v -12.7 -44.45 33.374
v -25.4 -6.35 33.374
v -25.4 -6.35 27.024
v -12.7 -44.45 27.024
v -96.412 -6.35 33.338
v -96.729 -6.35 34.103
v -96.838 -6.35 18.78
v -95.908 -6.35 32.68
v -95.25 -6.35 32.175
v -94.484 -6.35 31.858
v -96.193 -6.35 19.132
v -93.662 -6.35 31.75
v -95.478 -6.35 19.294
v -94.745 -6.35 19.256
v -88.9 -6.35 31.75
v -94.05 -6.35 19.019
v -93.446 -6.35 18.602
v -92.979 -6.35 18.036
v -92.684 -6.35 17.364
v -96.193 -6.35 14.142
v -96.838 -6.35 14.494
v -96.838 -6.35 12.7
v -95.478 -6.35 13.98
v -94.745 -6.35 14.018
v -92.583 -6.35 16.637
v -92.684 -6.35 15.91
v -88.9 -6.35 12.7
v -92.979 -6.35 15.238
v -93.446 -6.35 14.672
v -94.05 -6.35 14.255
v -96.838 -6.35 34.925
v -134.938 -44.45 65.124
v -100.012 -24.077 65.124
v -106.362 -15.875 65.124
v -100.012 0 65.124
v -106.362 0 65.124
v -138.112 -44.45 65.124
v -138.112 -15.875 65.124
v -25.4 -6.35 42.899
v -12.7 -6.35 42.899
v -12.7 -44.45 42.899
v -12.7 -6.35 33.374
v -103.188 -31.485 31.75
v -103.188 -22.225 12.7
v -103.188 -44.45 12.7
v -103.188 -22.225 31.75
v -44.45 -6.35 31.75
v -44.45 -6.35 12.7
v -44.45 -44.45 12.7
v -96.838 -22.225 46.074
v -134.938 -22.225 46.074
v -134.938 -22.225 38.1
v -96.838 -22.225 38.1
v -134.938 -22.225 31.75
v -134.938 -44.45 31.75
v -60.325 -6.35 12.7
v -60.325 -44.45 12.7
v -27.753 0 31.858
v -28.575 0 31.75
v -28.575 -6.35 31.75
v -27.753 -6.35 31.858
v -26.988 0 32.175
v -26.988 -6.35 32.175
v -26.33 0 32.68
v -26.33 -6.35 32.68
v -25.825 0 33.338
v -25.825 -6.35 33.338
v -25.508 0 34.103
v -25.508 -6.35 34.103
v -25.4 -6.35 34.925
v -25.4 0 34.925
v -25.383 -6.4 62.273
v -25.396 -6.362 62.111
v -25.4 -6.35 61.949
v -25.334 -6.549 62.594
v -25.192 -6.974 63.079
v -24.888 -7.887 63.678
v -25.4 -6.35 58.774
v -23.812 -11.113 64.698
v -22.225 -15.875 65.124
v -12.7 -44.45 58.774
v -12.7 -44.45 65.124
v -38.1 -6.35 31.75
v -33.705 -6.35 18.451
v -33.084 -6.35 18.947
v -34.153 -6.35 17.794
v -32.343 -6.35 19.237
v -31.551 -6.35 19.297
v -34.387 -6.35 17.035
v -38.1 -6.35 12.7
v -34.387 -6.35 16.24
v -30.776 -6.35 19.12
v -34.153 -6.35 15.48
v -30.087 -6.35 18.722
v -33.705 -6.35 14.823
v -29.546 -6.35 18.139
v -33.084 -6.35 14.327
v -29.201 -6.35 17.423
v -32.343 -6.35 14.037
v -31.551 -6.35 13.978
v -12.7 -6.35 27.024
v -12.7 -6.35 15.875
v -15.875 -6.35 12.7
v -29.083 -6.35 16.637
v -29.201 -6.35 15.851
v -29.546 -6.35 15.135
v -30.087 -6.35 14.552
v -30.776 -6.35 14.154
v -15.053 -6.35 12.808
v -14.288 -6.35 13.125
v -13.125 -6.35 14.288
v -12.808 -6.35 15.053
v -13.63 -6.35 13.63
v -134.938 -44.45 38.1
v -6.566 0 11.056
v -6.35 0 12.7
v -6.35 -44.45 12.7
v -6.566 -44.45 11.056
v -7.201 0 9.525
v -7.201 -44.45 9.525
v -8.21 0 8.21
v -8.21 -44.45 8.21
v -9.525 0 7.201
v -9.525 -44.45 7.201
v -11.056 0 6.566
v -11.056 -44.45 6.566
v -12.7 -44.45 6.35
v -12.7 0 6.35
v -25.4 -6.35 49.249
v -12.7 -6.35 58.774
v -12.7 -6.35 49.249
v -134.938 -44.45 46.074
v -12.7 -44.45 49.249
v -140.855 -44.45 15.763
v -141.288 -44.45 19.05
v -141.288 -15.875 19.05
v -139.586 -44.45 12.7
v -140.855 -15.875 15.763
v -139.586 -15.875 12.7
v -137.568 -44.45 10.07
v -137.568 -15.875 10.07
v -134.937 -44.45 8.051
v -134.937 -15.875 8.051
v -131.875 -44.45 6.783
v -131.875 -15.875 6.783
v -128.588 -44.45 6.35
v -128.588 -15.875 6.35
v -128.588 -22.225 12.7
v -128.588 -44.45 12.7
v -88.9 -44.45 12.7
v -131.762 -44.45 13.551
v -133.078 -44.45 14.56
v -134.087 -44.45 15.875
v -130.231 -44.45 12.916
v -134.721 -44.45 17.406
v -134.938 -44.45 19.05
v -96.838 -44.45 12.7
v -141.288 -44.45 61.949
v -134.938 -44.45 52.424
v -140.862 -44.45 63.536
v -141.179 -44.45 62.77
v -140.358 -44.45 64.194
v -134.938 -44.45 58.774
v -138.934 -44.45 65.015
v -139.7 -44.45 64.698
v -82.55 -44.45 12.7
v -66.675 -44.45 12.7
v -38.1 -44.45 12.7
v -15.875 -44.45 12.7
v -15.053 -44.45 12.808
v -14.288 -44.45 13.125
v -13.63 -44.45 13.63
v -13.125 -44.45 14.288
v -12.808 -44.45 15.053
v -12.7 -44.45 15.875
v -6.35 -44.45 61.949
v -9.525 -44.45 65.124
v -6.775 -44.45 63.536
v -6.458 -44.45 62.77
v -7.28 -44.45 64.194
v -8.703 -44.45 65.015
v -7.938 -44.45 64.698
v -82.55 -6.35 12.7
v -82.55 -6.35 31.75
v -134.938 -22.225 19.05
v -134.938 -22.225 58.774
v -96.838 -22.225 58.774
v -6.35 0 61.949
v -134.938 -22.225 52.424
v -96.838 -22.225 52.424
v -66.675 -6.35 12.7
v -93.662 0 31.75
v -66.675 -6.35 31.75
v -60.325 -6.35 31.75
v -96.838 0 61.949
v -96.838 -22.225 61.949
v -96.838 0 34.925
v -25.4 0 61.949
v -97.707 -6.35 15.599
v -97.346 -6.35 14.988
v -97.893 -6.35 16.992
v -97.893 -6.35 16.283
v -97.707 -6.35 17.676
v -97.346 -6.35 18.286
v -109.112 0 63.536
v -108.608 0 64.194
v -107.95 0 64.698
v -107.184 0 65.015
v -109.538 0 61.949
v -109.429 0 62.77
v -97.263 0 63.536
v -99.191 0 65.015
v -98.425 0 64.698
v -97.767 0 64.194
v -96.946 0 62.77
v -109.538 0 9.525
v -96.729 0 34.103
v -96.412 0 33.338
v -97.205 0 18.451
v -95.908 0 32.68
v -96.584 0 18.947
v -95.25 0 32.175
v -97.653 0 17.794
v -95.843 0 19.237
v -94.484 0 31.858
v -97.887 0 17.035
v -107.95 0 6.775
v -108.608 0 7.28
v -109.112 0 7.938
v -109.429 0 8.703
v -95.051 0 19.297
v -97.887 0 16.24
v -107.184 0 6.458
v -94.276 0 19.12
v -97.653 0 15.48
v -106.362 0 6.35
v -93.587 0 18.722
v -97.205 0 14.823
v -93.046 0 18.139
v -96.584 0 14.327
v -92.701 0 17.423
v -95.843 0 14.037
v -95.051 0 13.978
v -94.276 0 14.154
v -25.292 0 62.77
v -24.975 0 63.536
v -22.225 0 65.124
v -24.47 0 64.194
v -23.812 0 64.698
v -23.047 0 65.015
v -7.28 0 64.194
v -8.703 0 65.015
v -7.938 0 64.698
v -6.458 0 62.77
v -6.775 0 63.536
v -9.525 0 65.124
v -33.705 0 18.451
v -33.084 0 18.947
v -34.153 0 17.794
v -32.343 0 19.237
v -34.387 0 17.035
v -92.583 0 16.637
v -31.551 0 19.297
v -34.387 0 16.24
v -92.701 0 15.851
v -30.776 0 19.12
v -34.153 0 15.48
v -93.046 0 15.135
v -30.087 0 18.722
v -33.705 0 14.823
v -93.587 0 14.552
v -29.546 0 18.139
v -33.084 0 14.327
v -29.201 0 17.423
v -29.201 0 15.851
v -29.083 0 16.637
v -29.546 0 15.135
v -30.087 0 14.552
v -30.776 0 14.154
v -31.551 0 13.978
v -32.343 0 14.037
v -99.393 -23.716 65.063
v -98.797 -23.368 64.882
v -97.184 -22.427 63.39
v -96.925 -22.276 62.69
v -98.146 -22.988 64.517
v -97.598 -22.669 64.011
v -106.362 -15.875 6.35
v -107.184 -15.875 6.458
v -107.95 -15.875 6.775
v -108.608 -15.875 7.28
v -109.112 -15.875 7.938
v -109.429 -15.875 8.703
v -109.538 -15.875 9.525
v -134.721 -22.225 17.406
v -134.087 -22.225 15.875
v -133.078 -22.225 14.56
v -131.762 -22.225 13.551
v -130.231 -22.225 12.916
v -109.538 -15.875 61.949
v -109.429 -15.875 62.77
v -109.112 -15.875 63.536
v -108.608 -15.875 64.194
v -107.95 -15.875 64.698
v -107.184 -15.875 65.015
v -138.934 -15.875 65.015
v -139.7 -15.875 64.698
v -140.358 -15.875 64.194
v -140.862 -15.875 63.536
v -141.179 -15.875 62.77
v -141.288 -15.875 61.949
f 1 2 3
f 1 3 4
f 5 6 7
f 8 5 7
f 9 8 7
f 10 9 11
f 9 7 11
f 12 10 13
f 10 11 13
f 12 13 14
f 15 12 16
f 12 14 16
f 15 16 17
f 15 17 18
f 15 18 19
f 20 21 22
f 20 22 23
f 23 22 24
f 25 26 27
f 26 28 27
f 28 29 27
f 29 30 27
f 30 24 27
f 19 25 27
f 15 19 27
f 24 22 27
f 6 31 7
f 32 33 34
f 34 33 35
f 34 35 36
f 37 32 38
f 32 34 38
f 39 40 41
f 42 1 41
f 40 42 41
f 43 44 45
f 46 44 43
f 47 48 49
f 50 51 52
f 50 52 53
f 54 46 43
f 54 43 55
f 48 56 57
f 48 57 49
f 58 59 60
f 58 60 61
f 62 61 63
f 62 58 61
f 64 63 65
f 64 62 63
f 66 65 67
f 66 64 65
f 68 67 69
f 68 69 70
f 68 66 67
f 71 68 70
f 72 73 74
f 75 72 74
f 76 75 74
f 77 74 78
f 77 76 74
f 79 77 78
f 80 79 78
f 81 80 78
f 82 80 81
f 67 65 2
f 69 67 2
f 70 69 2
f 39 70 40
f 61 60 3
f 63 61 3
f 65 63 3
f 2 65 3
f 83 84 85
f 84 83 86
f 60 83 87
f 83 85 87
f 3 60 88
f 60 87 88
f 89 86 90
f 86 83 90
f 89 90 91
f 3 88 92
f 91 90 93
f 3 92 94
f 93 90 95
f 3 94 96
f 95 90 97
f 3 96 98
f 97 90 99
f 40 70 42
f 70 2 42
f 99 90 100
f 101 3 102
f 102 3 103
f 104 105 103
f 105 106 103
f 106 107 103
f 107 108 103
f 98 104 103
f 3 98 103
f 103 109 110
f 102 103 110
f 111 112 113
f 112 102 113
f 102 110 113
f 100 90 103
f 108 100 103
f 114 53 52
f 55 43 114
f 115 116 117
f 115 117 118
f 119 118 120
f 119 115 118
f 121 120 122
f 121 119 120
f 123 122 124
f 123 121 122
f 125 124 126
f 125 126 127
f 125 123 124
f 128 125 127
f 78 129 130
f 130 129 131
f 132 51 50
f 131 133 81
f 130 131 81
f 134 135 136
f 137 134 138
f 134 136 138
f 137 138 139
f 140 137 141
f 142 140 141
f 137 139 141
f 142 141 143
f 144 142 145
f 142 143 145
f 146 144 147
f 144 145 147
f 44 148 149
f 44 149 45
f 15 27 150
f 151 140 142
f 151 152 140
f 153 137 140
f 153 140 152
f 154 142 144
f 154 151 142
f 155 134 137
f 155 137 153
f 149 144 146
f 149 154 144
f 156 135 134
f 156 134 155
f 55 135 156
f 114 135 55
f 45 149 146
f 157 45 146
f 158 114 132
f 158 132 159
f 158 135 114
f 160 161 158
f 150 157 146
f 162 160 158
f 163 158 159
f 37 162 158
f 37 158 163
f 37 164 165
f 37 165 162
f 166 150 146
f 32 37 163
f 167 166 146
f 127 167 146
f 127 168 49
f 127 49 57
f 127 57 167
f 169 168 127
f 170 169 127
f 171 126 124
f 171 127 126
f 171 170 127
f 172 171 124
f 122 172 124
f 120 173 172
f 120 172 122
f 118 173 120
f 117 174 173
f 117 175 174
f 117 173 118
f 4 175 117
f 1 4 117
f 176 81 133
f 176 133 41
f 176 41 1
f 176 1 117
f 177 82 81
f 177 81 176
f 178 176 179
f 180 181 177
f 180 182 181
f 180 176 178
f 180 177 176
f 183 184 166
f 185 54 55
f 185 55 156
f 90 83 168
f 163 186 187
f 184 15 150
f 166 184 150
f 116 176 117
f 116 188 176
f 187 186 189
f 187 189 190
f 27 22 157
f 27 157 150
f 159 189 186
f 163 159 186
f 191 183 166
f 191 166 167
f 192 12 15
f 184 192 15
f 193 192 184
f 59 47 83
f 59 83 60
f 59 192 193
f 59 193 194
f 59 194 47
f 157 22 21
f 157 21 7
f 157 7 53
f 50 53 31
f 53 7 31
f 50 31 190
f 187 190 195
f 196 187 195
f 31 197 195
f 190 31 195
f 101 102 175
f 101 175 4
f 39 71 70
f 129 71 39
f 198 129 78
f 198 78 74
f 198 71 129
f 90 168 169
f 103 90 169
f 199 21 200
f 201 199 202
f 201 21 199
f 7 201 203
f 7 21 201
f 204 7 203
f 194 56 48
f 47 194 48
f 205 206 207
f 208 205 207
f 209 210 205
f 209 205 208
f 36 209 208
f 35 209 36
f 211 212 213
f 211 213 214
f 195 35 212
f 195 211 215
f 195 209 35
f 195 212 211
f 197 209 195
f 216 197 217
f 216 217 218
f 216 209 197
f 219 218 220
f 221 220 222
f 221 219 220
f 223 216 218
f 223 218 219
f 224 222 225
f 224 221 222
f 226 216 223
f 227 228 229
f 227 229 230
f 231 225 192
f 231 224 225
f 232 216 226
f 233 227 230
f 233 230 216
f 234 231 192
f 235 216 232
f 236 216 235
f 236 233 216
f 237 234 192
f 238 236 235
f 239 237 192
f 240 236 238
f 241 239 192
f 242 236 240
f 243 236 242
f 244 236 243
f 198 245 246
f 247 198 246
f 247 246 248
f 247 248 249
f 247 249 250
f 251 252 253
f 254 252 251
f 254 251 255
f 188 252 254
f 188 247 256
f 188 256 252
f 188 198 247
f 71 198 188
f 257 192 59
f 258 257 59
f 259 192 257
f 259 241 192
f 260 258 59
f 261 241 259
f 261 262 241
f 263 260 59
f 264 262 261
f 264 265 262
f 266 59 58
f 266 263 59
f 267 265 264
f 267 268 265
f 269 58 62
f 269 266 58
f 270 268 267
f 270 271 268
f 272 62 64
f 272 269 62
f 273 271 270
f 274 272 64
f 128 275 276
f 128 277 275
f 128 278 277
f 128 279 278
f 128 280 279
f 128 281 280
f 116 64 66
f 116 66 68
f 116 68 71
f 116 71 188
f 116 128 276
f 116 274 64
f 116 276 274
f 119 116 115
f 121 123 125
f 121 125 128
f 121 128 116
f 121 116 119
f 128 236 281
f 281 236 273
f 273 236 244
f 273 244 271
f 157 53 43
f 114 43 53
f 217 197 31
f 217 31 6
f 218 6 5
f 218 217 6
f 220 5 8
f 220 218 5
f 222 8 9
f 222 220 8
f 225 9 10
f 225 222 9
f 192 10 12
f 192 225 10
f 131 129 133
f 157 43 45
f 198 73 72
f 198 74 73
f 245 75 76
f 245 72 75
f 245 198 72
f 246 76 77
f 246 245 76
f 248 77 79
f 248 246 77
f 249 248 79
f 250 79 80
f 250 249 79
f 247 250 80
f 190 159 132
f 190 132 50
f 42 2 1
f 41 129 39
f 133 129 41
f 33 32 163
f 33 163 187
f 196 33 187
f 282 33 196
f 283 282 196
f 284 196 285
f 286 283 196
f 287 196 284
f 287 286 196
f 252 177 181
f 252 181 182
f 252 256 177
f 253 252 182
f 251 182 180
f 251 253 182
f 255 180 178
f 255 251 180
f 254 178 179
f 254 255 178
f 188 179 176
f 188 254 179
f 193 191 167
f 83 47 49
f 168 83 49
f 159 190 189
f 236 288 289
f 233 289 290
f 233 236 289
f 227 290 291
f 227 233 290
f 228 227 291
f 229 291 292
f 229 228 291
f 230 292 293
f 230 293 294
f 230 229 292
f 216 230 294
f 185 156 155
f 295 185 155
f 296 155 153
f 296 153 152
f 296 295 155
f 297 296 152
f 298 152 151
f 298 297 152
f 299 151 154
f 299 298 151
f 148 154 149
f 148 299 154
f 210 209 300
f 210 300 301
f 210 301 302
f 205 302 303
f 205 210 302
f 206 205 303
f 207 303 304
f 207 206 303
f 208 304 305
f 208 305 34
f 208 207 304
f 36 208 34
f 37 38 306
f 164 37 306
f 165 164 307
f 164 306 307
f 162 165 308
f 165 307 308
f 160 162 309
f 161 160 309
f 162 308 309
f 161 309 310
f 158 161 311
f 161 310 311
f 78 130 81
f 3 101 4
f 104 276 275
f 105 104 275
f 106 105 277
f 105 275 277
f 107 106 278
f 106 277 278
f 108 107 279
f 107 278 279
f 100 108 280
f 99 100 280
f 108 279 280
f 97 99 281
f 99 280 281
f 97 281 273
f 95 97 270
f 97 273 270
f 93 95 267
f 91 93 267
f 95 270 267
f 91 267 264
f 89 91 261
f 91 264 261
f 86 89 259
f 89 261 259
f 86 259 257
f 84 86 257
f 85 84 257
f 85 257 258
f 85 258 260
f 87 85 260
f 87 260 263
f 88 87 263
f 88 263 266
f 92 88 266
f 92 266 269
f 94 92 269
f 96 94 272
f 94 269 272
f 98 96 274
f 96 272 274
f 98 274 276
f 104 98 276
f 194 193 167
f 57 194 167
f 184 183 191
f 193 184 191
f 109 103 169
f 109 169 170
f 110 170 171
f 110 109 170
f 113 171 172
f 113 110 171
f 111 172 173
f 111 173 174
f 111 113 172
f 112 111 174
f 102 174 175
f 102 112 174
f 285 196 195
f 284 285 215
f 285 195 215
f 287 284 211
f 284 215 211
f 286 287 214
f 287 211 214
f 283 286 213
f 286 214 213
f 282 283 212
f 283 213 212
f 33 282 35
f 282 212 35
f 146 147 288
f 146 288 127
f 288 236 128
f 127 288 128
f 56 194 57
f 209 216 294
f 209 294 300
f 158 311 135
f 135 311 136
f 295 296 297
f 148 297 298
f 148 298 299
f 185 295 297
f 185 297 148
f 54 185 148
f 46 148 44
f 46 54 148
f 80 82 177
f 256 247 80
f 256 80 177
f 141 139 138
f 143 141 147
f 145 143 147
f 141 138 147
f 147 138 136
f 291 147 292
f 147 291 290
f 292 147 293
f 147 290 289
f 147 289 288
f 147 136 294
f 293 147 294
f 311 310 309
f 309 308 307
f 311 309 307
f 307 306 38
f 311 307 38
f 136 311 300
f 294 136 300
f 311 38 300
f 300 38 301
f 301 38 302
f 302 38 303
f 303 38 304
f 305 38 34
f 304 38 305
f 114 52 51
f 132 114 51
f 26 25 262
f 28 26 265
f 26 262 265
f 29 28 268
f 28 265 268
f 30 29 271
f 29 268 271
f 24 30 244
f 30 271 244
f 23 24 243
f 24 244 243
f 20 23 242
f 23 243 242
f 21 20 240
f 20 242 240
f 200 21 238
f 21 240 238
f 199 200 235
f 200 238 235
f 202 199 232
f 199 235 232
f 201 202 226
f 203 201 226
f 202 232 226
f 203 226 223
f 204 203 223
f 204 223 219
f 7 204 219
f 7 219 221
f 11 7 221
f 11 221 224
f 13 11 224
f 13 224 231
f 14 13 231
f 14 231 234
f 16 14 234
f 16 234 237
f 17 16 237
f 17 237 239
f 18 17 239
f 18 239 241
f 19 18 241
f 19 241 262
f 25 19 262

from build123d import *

# Parameters (mm, degrees)
SKETCH2_R           = 2.667
BOSS_EXTRUDE1_DEPTH = 6.35
BOSS_EXTRUDE2_DEPTH = 38.1
CUT_EXTRUDE1_DEPTH  = 50.8
CUT_EXTRUDE2_DEPTH  = 38.1
BOSS_EXTRUDE3_DEPTH = 9.525
BOSS_EXTRUDE4_DEPTH = 6.35
BOSS_EXTRUDE5_DEPTH = 22.225
CUT_EXTRUDE4_DEPTH  = 19.05
CUT_EXTRUDE7_DEPTH  = 19.05
CUT_EXTRUDE8_DEPTH  = 6.35
CUT_EXTRUDE9_DEPTH  = 6.35


with BuildPart() as part:
    # Sketch2 → Boss-Extrude1 (new body)
    with BuildSketch(Plane(origin=(0, 0, 0), x_dir=(1, 0, 0), z_dir=(0, 1, 0))):
        with BuildLine():
            Line((-109.5375, -9.525), (-109.5375, -61.948583794))
            ThreePointArc((-109.5375, -61.948583794), (-108.60756403, -64.193647824), (-106.3625, -65.123583794))
            Line((-106.3625, -65.123583794), (-100.0125, -65.123583794))
            ThreePointArc((-100.0125, -65.123583794), (-97.76743597, -64.193647824), (-96.8375, -61.948583794))
            Line((-96.8375, -61.948583794), (-96.8375, -34.925))
            ThreePointArc((-96.8375, -34.925), (-95.90756403, -32.67993597), (-93.6625, -31.75))
            Line((-93.6625, -31.75), (-28.575, -31.75))
            ThreePointArc((-28.575, -31.75), (-26.32993597, -32.67993597), (-25.4, -34.925))
            Line((-25.4, -34.925), (-25.4, -61.948583794))
            ThreePointArc((-25.4, -61.948583794), (-24.47006403, -64.193647824), (-22.225, -65.123583794))
            Line((-22.225, -65.123583794), (-9.525, -65.123583794))
            ThreePointArc((-9.525, -65.123583794), (-7.27993597, -64.193647824), (-6.35, -61.948583794))
            Line((-6.35, -61.948583794), (-6.35, -12.7))
            ThreePointArc((-6.35, -12.7), (-8.209871939, -8.209871939), (-12.7, -6.35))
            Line((-12.7, -6.35), (-106.3625, -6.35))
            ThreePointArc((-106.3625, -6.35), (-108.60756403, -7.27993597), (-109.5375, -9.525))
        make_face()
        with Locations((-95.25, -16.637060646)):
            Circle(SKETCH2_R, mode=Mode.SUBTRACT)
        with Locations((-31.75, -16.637060646)):
            Circle(SKETCH2_R, mode=Mode.SUBTRACT)
    extrude(amount=-BOSS_EXTRUDE1_DEPTH)

    # Sketch3 → Boss-Extrude2 (add)
    with BuildSketch(Plane.XZ.offset(6.35)):
        with BuildLine():
            Line((-6.35, 61.948583794), (-6.35, 12.7))
            ThreePointArc((-6.35, 12.7), (-8.209871939, 8.209871939), (-12.7, 6.35))
            Line((-12.7, 6.35), (-96.8375, 6.35))
            Line((-96.8375, 6.35), (-96.8375, 12.7))
            Line((-96.8375, 12.7), (-88.9, 12.7))
            Line((-88.9, 12.7), (-88.9, 31.75))
            Line((-88.9, 31.75), (-82.55, 31.75))
            Line((-82.55, 31.75), (-82.55, 12.7))
            Line((-82.55, 12.7), (-66.675, 12.7))
            Line((-66.675, 12.7), (-66.675, 31.75))
            Line((-66.675, 31.75), (-60.325, 31.75))
            Line((-60.325, 31.75), (-60.325, 12.7))
            Line((-60.325, 12.7), (-44.45, 12.7))
            Line((-44.45, 12.7), (-44.45, 31.75))
            Line((-44.45, 31.75), (-38.1, 31.75))
            Line((-38.1, 31.75), (-38.1, 12.7))
            Line((-38.1, 12.7), (-15.875, 12.7))
            ThreePointArc((-15.875, 12.7), (-13.62993597, 13.62993597), (-12.7, 15.875))
            Line((-12.7, 15.875), (-12.7, 27.023583794))
            Line((-12.7, 27.023583794), (-25.4, 27.023583794))
            Line((-25.4, 27.023583794), (-25.4, 33.373583794))
            Line((-25.4, 33.373583794), (-12.7, 33.373583794))
            Line((-12.7, 33.373583794), (-12.7, 42.898583794))
            Line((-12.7, 42.898583794), (-25.4, 42.898583794))
            Line((-25.4, 42.898583794), (-25.4, 49.248583794))
            Line((-25.4, 49.248583794), (-12.7, 49.248583794))
            Line((-12.7, 49.248583794), (-12.7, 58.773583794))
            Line((-12.7, 58.773583794), (-25.4, 58.773583794))
            Line((-25.4, 58.773583794), (-25.4, 61.948583794))
            ThreePointArc((-25.4, 61.948583794), (-24.47006403, 64.193647824), (-22.225, 65.123583794))
            Line((-22.225, 65.123583794), (-9.525, 65.123583794))
            ThreePointArc((-9.525, 65.123583794), (-7.27993597, 64.193647824), (-6.35, 61.948583794))
        make_face()
    extrude(amount=BOSS_EXTRUDE2_DEPTH)

    # Sketch4 → Cut-Extrude1 (cut)
    with BuildSketch(Plane.ZY.offset(88.9)):
        Polygon((31.75, -6.35), (12.7, -44.45), (31.75, -44.45), align=None)
    extrude(amount=-CUT_EXTRUDE1_DEPTH, mode=Mode.SUBTRACT)

    # Sketch5 → Cut-Extrude2 (cut)
    with BuildSketch(Plane.XY.offset(65.123583794)):
        Polygon((-25.4, -6.35), (-12.7, -44.45), (-25.4, -44.45), align=None)
    extrude(amount=-CUT_EXTRUDE2_DEPTH, mode=Mode.SUBTRACT)

    # Sketch6 → Boss-Extrude3 (add)
    with BuildSketch(Plane.XZ.offset(6.35)):
        with BuildLine():
            Line((-96.8375, 6.35), (-106.3625, 6.35))
            ThreePointArc((-106.3625, 6.35), (-108.60756403, 7.27993597), (-109.5375, 9.525))
            Line((-109.5375, 9.525), (-109.5375, 61.948583794))
            ThreePointArc((-109.5375, 61.948583794), (-108.60756403, 64.193647824), (-106.3625, 65.123583794))
            Line((-106.3625, 65.123583794), (-100.0125, 65.123583794))
            ThreePointArc((-100.0125, 65.123583794), (-97.76743597, 64.193647824), (-96.8375, 61.948583794))
            Line((-96.8375, 61.948583794), (-96.8375, 6.35))
        make_face()
    extrude(amount=BOSS_EXTRUDE3_DEPTH)

    # Sketch7 → Boss-Extrude4 (add)
    with BuildSketch(Plane.XZ.offset(15.875)):
        with BuildLine():
            Line((-100.0125, 65.123583794), (-138.1125, 65.123583794))
            ThreePointArc((-138.1125, 65.123583794), (-140.35756403, 64.193647824), (-141.2875, 61.948583794))
            Line((-141.2875, 61.948583794), (-141.2875, 19.05))
            ThreePointArc((-141.2875, 19.05), (-137.567756121, 10.069743879), (-128.5875, 6.35))
            Line((-128.5875, 6.35), (-96.8375, 6.35))
            Line((-96.8375, 6.35), (-96.8375, 61.948583794))
            ThreePointArc((-96.8375, 61.948583794), (-97.76743597, 64.193647824), (-100.0125, 65.123583794))
        make_face()
    extrude(amount=BOSS_EXTRUDE4_DEPTH)

    # Sketch8 → Boss-Extrude5 (add)
    with BuildSketch(Plane.XZ.offset(22.225)):
        with BuildLine():
            Line((-128.5875, 6.35), (-96.8375, 6.35))
            Line((-96.8375, 6.35), (-96.8375, 12.7))
            Line((-96.8375, 12.7), (-96.8375, 38.1))
            Line((-96.8375, 38.1), (-134.9375, 38.1))
            Line((-134.9375, 38.1), (-134.9375, 46.073583794))
            Line((-134.9375, 46.073583794), (-96.8375, 46.073583794))
            Line((-96.8375, 46.073583794), (-96.8375, 52.423583794))
            Line((-96.8375, 52.423583794), (-134.9375, 52.423583794))
            Line((-134.9375, 52.423583794), (-134.9375, 58.773583794))
            Line((-134.9375, 58.773583794), (-96.8375, 58.773583794))
            Line((-96.8375, 58.773583794), (-96.8375, 61.948583794))
            ThreePointArc((-96.8375, 61.948583794), (-97.76743597, 64.193647824), (-100.0125, 65.123583794))
            Line((-100.0125, 65.123583794), (-138.1125, 65.123583794))
            ThreePointArc((-138.1125, 65.123583794), (-140.35756403, 64.193647824), (-141.2875, 61.948583794))
            Line((-141.2875, 61.948583794), (-141.2875, 19.05))
            ThreePointArc((-141.2875, 19.05), (-137.567756121, 10.069743879), (-128.5875, 6.35))
        make_face()
        with BuildLine():
            Line((-128.5875, 12.7), (-103.1875, 12.7))
            Line((-103.1875, 12.7), (-103.1875, 31.75))
            Line((-103.1875, 31.75), (-134.9375, 31.75))
            Line((-134.9375, 31.75), (-134.9375, 19.05))
            ThreePointArc((-134.9375, 19.05), (-133.07762806, 14.559871939), (-128.5875, 12.7))
        make_face(mode=Mode.SUBTRACT)
    extrude(amount=BOSS_EXTRUDE5_DEPTH)

    # Sketch11 → Cut-Extrude4 (cut)
    with BuildSketch(Plane.XY.offset(65.123583794)):
        Polygon((-134.9375, -44.45), (-96.8375, -22.225), (-96.8375, -44.45), align=None)
    extrude(amount=-CUT_EXTRUDE4_DEPTH, mode=Mode.SUBTRACT)

    # Sketch23 → Cut-Extrude7 (cut)
    with BuildSketch(Plane(origin=(-0.256512778, 0.439736191, -0.384769167), x_dir=(0.915651215, 0.302516036, -0.264701531), z_dir=(-0.401973696, 0.689097765, -0.602960544))):
        Polygon((-105.477921765, 19.712805797), (-105.477921765, -14.037907158), (-147.087651949, 0.597357751), align=None)
    extrude(amount=-CUT_EXTRUDE7_DEPTH, mode=Mode.SUBTRACT)

    # Sketch24 → Cut-Extrude8 (cut)
    with BuildSketch(Plane.ZY.offset(103.1875)):
        Polygon((31.75, -31.485416667), (12.7, -44.45), (16.933333333, -44.45), align=None)
    extrude(amount=-CUT_EXTRUDE8_DEPTH, mode=Mode.SUBTRACT)

    # Sketch25 → Cut-Extrude9 (cut)
    with BuildSketch(Plane(origin=(0, 0, 31.75), x_dir=(-1, 0, 0), z_dir=(0, 0, -1))):
        Polygon((103.1875, -31.485416667), (134.9375, -44.45), (125.4125, -44.45), align=None)
    extrude(amount=-CUT_EXTRUDE9_DEPTH, mode=Mode.SUBTRACT)


solid = part.part
